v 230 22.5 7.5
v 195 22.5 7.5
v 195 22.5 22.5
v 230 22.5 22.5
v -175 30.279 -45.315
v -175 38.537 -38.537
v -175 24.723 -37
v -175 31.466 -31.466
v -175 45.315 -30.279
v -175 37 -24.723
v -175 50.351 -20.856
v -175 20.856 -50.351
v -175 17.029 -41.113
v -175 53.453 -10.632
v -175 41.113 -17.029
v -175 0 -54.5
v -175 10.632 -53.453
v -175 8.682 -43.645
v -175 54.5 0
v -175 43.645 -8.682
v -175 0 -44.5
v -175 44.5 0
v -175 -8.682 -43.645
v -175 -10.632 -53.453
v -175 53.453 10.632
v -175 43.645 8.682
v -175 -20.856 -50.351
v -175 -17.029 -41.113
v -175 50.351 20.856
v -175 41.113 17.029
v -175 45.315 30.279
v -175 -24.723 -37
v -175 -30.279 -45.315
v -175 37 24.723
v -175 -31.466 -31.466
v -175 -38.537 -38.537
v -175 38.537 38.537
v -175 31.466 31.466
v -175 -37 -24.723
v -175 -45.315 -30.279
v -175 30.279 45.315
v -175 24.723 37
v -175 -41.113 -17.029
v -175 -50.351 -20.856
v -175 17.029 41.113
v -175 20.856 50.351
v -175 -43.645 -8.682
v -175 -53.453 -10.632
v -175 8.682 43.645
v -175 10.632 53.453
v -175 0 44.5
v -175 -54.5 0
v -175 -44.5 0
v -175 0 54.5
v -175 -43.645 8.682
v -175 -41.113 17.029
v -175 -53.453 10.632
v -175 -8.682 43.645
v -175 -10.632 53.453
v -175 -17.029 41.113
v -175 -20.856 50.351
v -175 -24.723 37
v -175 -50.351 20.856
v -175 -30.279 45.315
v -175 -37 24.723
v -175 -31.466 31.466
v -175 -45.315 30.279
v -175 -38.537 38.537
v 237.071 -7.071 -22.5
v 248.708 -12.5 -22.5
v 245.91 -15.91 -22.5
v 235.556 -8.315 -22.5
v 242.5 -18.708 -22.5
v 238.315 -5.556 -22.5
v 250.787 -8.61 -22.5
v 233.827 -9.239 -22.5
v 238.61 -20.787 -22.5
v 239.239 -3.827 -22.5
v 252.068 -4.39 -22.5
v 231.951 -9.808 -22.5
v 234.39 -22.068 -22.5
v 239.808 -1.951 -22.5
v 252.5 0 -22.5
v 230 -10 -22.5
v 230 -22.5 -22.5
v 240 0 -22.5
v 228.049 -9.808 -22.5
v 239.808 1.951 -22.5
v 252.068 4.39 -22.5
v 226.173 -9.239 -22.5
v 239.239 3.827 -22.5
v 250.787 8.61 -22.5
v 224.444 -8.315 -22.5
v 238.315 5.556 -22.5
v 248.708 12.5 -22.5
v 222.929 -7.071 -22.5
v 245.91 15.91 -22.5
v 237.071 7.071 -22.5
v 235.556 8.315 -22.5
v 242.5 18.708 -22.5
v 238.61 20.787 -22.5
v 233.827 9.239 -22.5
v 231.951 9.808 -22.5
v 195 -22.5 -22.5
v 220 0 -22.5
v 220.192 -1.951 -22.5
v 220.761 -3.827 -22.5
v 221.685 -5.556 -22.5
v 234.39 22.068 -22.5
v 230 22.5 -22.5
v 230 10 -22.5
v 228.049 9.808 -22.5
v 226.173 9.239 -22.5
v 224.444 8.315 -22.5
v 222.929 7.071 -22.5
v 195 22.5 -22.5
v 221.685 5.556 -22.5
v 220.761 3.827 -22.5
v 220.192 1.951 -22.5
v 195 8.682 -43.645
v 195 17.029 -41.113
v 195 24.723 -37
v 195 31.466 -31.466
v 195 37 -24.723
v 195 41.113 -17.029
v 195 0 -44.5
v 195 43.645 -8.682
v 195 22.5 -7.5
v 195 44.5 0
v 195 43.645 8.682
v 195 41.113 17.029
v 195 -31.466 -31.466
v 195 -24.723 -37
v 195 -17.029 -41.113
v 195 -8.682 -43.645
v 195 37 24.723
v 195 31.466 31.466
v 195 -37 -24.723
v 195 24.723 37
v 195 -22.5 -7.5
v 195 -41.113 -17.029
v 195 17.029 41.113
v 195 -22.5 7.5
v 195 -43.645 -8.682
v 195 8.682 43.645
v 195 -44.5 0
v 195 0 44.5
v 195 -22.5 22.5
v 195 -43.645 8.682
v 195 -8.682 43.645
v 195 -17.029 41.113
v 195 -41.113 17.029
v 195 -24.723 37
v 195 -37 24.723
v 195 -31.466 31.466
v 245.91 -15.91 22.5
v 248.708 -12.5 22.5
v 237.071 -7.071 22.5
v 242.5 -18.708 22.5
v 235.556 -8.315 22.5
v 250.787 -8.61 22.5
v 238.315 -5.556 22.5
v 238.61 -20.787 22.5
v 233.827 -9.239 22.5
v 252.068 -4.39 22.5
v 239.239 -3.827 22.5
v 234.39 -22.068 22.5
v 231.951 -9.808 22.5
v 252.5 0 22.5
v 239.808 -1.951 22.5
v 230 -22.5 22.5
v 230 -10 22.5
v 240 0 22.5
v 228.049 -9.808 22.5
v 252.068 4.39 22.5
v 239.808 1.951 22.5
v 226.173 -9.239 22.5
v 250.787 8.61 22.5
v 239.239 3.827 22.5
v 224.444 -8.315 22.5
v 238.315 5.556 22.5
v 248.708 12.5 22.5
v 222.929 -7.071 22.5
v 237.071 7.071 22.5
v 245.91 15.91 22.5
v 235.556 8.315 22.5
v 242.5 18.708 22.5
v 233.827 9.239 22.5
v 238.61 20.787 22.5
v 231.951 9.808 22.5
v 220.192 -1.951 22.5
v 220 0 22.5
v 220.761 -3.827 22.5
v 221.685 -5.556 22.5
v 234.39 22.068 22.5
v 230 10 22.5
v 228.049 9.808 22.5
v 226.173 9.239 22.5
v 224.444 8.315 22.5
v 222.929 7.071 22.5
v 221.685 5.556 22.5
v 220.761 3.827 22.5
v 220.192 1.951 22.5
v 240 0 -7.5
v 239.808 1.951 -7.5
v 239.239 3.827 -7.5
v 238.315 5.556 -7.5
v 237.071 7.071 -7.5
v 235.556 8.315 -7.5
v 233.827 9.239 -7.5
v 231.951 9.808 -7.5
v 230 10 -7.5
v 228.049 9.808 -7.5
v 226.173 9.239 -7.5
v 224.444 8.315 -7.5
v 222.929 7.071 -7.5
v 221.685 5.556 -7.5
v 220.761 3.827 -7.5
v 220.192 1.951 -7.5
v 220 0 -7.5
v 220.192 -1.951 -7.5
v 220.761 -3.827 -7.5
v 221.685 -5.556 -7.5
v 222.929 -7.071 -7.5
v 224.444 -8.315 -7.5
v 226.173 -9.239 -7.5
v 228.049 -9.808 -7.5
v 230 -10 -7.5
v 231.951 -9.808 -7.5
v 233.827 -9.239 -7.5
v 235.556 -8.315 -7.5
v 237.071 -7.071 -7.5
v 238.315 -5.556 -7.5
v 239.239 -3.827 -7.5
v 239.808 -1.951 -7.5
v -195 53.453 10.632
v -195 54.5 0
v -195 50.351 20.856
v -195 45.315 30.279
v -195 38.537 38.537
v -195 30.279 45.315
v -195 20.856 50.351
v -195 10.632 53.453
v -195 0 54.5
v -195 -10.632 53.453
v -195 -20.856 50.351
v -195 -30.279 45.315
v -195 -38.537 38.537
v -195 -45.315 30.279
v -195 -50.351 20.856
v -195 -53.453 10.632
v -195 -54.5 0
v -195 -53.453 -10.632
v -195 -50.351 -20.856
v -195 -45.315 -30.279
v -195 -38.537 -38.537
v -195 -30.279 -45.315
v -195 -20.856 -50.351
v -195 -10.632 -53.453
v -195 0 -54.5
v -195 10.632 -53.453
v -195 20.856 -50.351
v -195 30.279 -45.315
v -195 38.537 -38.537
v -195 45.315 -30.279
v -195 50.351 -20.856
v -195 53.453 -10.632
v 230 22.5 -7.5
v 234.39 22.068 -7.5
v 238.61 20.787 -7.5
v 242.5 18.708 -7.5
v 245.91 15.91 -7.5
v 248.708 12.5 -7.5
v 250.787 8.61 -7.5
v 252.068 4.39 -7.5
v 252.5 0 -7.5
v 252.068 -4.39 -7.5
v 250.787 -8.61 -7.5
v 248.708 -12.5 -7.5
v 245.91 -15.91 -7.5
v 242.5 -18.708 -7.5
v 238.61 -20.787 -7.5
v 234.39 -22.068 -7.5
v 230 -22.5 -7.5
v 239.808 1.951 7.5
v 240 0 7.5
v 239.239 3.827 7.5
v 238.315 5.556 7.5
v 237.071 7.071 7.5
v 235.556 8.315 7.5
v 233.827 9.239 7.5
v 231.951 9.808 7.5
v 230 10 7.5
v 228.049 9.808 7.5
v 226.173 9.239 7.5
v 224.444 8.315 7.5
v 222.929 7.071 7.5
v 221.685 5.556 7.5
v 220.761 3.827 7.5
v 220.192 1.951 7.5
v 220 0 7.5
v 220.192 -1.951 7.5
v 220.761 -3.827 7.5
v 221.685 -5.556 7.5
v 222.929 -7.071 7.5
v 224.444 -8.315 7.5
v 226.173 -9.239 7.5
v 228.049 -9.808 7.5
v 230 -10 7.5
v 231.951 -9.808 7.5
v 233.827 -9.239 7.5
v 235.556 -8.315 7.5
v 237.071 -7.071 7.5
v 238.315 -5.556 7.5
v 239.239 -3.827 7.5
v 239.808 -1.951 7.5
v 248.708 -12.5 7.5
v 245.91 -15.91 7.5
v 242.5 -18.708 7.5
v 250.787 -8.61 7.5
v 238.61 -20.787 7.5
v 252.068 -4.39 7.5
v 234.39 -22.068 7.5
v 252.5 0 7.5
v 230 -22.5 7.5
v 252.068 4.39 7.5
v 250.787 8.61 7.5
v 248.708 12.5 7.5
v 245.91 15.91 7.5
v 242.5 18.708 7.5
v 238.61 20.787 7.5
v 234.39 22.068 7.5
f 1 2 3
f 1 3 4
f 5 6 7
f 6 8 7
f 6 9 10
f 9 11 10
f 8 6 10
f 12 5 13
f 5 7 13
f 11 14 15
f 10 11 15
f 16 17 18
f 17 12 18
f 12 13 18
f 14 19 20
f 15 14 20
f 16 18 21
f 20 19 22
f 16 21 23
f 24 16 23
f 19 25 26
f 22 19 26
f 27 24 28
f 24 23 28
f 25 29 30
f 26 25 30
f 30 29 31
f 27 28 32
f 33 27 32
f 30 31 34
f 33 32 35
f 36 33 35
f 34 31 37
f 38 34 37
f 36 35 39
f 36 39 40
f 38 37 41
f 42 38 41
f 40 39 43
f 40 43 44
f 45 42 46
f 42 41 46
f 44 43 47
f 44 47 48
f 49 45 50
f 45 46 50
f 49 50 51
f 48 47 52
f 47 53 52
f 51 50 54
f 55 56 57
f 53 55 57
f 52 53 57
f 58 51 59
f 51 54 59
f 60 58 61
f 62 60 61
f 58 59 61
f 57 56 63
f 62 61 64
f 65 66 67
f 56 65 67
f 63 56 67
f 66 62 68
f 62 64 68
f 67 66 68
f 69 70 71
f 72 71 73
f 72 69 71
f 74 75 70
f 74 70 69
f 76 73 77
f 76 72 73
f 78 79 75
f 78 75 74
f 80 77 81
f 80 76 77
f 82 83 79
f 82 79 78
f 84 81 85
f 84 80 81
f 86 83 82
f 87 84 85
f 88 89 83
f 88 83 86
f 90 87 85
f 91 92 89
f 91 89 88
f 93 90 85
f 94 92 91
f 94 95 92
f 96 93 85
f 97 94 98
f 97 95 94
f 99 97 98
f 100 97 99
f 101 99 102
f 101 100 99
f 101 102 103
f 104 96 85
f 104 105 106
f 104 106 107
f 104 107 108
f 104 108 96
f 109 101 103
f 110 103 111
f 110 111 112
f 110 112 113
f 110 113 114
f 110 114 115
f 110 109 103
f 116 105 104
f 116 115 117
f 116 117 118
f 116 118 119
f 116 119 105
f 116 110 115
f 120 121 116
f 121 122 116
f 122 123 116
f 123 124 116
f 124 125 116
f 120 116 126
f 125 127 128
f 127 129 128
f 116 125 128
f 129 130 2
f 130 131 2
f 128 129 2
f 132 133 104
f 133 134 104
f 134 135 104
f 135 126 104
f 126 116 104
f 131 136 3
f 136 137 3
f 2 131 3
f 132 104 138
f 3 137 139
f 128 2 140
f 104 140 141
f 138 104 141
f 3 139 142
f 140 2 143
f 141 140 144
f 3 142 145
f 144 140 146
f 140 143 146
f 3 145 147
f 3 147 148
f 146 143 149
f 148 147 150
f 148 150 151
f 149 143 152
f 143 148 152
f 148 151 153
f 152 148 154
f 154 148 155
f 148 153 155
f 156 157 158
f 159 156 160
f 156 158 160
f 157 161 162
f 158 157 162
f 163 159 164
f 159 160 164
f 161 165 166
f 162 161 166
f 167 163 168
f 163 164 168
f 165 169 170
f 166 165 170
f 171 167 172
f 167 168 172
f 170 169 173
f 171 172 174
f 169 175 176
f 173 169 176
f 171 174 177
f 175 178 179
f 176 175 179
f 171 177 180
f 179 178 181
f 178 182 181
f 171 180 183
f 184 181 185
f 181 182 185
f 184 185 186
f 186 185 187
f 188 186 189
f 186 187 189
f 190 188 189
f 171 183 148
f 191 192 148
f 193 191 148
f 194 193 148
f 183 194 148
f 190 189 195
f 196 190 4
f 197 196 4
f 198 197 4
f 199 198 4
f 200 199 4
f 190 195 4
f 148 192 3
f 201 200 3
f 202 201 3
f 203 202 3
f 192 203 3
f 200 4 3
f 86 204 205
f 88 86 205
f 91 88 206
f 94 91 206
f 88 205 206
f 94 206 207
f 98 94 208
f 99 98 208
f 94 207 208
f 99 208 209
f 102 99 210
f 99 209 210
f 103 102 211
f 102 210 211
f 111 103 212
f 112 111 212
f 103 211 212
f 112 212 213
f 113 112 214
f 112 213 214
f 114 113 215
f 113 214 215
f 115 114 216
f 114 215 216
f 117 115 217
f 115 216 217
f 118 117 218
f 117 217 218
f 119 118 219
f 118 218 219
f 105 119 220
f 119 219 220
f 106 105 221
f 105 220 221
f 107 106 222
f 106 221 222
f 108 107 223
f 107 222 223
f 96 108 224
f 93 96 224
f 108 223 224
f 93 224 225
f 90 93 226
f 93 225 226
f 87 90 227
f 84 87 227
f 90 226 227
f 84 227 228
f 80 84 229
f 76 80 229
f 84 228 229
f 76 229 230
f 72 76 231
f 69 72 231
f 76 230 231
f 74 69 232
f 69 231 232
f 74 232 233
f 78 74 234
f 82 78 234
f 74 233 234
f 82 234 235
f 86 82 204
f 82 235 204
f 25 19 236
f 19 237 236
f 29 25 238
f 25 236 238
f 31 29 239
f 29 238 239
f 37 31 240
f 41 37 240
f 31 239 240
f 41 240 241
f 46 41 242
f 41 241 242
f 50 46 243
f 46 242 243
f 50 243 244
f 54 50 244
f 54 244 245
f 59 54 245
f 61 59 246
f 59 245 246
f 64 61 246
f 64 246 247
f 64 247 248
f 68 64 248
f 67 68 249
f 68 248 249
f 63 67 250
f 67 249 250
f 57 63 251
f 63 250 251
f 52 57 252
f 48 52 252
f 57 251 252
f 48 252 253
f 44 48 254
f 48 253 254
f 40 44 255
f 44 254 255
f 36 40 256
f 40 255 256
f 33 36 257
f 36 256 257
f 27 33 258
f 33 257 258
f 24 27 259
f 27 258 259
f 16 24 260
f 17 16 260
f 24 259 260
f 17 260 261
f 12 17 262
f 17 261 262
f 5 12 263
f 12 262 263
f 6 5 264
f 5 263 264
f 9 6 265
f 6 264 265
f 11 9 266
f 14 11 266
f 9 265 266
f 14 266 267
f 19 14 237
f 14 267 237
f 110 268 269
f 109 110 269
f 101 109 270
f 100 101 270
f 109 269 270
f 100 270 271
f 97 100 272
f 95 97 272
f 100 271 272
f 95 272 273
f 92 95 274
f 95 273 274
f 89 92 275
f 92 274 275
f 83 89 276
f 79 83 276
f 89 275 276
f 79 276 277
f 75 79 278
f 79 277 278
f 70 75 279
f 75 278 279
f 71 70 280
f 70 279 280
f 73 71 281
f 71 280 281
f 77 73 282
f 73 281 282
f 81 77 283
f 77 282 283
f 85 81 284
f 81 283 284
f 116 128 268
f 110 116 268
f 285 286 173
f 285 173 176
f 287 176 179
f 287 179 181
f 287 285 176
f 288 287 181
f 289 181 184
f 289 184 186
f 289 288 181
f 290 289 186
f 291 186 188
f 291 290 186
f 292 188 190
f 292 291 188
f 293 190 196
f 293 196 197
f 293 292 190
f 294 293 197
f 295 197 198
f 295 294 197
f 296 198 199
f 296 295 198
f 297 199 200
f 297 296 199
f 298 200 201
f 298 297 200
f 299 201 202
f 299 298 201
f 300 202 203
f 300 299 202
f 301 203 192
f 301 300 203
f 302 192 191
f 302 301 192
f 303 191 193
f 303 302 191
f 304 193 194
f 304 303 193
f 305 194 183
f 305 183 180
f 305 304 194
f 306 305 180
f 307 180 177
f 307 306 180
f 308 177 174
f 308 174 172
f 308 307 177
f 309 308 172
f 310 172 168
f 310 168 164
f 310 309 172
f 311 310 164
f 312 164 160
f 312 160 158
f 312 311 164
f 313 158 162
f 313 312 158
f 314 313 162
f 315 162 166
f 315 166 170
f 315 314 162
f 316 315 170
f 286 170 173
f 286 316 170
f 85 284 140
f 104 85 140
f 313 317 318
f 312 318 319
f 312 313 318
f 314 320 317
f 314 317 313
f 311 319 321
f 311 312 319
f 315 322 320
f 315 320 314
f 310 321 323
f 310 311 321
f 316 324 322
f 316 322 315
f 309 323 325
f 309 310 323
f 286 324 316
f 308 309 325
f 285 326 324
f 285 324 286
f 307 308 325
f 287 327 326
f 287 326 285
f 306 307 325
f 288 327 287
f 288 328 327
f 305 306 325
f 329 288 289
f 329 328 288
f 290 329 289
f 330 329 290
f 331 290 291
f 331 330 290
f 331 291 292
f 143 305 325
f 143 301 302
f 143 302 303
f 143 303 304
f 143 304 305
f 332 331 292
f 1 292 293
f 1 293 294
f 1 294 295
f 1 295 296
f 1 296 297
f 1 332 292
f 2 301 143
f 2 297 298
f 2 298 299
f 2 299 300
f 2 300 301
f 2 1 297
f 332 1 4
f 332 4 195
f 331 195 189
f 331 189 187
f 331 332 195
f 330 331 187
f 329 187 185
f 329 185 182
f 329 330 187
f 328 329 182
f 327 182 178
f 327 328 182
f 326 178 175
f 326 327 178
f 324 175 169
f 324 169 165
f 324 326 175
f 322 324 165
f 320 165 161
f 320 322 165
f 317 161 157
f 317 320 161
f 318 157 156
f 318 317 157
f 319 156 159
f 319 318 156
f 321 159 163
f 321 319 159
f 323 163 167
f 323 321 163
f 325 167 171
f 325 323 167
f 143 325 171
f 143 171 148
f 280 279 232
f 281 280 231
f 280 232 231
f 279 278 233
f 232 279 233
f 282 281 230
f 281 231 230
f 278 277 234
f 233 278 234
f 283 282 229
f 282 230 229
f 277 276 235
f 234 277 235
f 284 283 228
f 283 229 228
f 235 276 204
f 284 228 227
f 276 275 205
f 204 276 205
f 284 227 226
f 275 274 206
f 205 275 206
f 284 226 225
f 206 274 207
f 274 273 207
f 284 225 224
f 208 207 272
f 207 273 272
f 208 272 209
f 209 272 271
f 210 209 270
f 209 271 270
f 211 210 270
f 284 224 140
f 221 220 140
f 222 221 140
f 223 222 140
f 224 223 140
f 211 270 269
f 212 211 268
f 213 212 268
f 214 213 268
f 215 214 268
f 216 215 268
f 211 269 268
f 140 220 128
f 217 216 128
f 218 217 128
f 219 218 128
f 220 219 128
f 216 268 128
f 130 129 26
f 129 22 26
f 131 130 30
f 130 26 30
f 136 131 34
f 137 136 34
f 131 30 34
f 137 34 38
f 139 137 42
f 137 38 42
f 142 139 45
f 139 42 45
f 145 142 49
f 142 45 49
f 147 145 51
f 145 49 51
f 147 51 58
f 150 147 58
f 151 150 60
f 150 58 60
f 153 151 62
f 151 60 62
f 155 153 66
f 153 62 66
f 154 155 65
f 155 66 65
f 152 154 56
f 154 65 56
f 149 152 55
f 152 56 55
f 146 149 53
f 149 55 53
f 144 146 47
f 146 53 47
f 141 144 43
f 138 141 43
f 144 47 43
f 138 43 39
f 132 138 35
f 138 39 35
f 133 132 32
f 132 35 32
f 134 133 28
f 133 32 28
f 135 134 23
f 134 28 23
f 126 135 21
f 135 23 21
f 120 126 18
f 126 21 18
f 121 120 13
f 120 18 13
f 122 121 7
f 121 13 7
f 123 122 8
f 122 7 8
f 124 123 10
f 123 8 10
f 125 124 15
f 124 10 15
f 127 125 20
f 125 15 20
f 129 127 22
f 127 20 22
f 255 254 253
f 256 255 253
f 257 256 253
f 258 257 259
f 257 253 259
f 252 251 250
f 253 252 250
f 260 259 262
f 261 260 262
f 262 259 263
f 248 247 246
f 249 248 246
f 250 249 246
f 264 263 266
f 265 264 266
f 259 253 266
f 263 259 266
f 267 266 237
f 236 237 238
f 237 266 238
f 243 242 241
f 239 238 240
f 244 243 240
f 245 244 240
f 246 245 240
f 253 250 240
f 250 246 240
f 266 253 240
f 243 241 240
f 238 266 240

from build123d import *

# Parameters (mm, degrees)
SKETCH3_R           = 10
BOSS_EXTRUDE1_DEPTH = 15


with BuildPart() as part:
    # Sketch2 → Revolve1 (revolve)
    with BuildSketch(Plane.XY):
        Polygon((-195, 0), (195, 0), (195, 44.5), (-175, 44.5), (-175, 54.5), (-195, 54.5), align=None)
    revolve(axis=Axis((-195, 0, 0), (1, 0, 0)))

    # Sketch3 → Boss-Extrude1 (add)
    with BuildSketch(Plane.XY.offset(7.5)):
        with BuildLine():
            Line((195, 22.5), (230, 22.5))
            ThreePointArc((230, 22.5), (252.5, 0), (230, -22.5))
            Line((230, -22.5), (195, -22.5))
            Line((195, -22.5), (195, 22.5))
        make_face()
        with Locations((230, 0)):
            Circle(SKETCH3_R, mode=Mode.SUBTRACT)
    boss_extrude1 = extrude(amount=BOSS_EXTRUDE1_DEPTH)

    # Mirror1: Boss-Extrude1 across plane
    add(boss_extrude1.mirror(Plane.XY))


solid = part.part
